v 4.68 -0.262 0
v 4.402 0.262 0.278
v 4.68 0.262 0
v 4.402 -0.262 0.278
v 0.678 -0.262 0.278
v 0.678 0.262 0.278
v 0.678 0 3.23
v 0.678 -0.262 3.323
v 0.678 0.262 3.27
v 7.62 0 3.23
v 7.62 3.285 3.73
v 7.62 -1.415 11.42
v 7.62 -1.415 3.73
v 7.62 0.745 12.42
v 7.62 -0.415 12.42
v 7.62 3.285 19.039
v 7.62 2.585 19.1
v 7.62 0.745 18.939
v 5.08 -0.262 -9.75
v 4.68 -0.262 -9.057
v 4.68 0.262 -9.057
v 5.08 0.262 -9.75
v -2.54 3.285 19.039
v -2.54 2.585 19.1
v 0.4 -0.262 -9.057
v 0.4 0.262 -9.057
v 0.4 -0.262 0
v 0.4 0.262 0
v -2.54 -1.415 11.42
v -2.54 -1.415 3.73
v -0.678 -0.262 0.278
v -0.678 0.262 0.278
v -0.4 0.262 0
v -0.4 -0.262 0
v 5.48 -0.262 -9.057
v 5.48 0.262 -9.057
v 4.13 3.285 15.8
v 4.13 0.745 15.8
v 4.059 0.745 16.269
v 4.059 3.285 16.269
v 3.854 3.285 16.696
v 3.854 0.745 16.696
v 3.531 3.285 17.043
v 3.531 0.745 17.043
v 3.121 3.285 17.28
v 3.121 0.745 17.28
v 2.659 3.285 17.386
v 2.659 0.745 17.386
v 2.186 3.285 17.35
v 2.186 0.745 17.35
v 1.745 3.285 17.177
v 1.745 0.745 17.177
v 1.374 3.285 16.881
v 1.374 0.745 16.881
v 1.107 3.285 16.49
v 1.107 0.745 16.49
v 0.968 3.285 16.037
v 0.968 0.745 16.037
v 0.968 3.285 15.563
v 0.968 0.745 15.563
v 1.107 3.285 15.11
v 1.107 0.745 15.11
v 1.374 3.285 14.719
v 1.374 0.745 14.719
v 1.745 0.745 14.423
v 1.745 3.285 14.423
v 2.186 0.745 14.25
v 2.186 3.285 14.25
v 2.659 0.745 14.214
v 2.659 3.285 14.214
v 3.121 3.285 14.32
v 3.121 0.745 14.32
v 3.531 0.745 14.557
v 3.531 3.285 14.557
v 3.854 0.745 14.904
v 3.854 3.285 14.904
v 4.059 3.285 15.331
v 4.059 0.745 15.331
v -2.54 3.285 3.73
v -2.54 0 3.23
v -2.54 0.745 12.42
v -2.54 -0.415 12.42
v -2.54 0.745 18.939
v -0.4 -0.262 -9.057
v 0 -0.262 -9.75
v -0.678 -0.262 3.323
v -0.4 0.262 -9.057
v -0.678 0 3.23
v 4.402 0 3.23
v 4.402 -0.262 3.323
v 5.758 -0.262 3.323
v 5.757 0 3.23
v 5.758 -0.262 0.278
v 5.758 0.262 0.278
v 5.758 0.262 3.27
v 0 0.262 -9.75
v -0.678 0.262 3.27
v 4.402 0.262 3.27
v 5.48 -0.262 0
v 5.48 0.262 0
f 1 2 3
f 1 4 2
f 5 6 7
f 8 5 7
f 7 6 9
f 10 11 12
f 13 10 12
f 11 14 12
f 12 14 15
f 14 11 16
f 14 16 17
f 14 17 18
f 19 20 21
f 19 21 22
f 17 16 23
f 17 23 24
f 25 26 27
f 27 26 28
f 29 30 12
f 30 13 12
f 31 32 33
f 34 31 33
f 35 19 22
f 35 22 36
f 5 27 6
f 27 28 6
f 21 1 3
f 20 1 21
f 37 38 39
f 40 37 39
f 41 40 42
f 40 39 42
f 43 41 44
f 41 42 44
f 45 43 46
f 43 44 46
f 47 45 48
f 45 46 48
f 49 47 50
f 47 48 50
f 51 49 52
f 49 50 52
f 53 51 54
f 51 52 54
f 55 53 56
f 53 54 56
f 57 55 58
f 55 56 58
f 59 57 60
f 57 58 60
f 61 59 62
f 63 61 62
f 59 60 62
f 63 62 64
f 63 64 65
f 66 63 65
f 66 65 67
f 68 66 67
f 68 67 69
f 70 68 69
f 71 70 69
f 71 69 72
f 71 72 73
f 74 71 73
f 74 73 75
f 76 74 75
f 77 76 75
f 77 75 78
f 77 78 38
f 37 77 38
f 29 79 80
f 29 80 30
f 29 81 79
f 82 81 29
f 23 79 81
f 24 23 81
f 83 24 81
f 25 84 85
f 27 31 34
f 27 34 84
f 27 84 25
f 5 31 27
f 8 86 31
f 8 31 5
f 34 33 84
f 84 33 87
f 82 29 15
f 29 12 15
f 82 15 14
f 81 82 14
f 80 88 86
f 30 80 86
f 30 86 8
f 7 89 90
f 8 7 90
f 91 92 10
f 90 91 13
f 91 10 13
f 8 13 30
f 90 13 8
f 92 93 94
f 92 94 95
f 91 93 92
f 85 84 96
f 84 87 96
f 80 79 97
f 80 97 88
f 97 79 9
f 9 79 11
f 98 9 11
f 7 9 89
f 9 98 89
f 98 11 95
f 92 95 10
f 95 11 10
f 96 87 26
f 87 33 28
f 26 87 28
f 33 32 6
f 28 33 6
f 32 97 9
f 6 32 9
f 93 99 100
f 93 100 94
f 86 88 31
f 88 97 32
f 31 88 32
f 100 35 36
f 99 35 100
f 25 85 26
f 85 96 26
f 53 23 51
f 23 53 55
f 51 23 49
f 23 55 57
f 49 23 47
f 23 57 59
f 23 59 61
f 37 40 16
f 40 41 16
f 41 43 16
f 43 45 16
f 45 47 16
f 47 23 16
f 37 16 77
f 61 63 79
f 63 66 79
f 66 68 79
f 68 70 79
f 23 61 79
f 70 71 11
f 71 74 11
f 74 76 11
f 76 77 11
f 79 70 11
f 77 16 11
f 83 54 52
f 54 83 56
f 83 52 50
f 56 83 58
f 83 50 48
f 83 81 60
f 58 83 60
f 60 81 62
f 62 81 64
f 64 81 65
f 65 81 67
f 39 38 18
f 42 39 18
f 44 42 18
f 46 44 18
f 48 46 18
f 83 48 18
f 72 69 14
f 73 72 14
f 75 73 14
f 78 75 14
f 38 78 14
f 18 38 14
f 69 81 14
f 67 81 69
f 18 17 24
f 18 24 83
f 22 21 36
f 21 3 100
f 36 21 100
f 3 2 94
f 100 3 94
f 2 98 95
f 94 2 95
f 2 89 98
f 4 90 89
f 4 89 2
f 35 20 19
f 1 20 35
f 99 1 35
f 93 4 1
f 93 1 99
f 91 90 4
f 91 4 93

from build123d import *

# Parameters (mm, degrees)
PAD001_DEPTH    = 5.08
PAD_DEPTH       = 0.2625
SKETCH004_W     = 10.16
SKETCH004_H     = 2.54
PAD002_DEPTH    = 14.1
SKETCH005_R     = 1.59
POCKET_DEPTH    = 2.541
POCKET001_DEPTH = 10.161


with BuildPart() as pad001:
    # Sketch001 → Pad001 (new body, symmetric)
    with BuildSketch(Plane.YZ.offset(2.54)):
        Polygon((0, 3.23), (-1.415, 3.73), (-1.415, 11.42), (-0.415, 12.42), (3.285, 12.42), (3.285, 3.73), align=None)
    extrude(amount=PAD001_DEPTH, both=True)


with BuildPart() as pad:
    # Sketch → Pad (new body, symmetric)
    with BuildSketch(Plane.XZ):
        Polygon((-0.6775, 0.2775), (-0.4, 0), (-0.4, -9.05718), (0, -9.75), (0.4, -9.05718), (0.4, 0), (0.6775, 0.2775), (0.6775, 3.73), (-0.6775, 3.73), align=None)
        Polygon((4.4025, 0.2775), (4.68, 0), (4.68, -9.05718), (5.08, -9.75), (5.48, -9.05718), (5.48, 0), (5.7575, 0.2775), (5.7575, 3.73), (4.4025, 3.73), align=None)
    extrude(amount=PAD_DEPTH, both=True)


with BuildPart() as to_220f_2_vertical:
    # Sketch004 → Pad002 (new body)
    with BuildSketch(Plane.XY.offset(5)):
        with Locations((2.54, 2.015)):
            Rectangle(SKETCH004_W, SKETCH004_H)
    extrude(amount=PAD002_DEPTH)

    # Sketch005 → Pocket (cut, through all)
    with BuildSketch(Plane(origin=(0, 0.745, 5), x_dir=(1, 0, 0), z_dir=(0, -1, 0))):
        with Locations((2.54, 10.8)):
            Circle(SKETCH005_R)
    extrude(amount=-POCKET_DEPTH, mode=Mode.SUBTRACT)

    # Sketch006 → Pocket001 (cut, through all)
    with BuildSketch(Plane(origin=(7.62, 0, 5), x_dir=(0, 1, 0), z_dir=(1, 0, 0))):
        Polygon((2.585, 14.1), (0.745, 13.939021), (0.745, 14.939021), (3.285, 14.939021), (3.285, 14.038758), align=None)
    extrude(amount=-POCKET001_DEPTH, mode=Mode.SUBTRACT)

    # Pocket001_mp_cp: union Pad001, Pad
    add(pad001.part)
    add(pad.part)


solid = to_220f_2_vertical.part
